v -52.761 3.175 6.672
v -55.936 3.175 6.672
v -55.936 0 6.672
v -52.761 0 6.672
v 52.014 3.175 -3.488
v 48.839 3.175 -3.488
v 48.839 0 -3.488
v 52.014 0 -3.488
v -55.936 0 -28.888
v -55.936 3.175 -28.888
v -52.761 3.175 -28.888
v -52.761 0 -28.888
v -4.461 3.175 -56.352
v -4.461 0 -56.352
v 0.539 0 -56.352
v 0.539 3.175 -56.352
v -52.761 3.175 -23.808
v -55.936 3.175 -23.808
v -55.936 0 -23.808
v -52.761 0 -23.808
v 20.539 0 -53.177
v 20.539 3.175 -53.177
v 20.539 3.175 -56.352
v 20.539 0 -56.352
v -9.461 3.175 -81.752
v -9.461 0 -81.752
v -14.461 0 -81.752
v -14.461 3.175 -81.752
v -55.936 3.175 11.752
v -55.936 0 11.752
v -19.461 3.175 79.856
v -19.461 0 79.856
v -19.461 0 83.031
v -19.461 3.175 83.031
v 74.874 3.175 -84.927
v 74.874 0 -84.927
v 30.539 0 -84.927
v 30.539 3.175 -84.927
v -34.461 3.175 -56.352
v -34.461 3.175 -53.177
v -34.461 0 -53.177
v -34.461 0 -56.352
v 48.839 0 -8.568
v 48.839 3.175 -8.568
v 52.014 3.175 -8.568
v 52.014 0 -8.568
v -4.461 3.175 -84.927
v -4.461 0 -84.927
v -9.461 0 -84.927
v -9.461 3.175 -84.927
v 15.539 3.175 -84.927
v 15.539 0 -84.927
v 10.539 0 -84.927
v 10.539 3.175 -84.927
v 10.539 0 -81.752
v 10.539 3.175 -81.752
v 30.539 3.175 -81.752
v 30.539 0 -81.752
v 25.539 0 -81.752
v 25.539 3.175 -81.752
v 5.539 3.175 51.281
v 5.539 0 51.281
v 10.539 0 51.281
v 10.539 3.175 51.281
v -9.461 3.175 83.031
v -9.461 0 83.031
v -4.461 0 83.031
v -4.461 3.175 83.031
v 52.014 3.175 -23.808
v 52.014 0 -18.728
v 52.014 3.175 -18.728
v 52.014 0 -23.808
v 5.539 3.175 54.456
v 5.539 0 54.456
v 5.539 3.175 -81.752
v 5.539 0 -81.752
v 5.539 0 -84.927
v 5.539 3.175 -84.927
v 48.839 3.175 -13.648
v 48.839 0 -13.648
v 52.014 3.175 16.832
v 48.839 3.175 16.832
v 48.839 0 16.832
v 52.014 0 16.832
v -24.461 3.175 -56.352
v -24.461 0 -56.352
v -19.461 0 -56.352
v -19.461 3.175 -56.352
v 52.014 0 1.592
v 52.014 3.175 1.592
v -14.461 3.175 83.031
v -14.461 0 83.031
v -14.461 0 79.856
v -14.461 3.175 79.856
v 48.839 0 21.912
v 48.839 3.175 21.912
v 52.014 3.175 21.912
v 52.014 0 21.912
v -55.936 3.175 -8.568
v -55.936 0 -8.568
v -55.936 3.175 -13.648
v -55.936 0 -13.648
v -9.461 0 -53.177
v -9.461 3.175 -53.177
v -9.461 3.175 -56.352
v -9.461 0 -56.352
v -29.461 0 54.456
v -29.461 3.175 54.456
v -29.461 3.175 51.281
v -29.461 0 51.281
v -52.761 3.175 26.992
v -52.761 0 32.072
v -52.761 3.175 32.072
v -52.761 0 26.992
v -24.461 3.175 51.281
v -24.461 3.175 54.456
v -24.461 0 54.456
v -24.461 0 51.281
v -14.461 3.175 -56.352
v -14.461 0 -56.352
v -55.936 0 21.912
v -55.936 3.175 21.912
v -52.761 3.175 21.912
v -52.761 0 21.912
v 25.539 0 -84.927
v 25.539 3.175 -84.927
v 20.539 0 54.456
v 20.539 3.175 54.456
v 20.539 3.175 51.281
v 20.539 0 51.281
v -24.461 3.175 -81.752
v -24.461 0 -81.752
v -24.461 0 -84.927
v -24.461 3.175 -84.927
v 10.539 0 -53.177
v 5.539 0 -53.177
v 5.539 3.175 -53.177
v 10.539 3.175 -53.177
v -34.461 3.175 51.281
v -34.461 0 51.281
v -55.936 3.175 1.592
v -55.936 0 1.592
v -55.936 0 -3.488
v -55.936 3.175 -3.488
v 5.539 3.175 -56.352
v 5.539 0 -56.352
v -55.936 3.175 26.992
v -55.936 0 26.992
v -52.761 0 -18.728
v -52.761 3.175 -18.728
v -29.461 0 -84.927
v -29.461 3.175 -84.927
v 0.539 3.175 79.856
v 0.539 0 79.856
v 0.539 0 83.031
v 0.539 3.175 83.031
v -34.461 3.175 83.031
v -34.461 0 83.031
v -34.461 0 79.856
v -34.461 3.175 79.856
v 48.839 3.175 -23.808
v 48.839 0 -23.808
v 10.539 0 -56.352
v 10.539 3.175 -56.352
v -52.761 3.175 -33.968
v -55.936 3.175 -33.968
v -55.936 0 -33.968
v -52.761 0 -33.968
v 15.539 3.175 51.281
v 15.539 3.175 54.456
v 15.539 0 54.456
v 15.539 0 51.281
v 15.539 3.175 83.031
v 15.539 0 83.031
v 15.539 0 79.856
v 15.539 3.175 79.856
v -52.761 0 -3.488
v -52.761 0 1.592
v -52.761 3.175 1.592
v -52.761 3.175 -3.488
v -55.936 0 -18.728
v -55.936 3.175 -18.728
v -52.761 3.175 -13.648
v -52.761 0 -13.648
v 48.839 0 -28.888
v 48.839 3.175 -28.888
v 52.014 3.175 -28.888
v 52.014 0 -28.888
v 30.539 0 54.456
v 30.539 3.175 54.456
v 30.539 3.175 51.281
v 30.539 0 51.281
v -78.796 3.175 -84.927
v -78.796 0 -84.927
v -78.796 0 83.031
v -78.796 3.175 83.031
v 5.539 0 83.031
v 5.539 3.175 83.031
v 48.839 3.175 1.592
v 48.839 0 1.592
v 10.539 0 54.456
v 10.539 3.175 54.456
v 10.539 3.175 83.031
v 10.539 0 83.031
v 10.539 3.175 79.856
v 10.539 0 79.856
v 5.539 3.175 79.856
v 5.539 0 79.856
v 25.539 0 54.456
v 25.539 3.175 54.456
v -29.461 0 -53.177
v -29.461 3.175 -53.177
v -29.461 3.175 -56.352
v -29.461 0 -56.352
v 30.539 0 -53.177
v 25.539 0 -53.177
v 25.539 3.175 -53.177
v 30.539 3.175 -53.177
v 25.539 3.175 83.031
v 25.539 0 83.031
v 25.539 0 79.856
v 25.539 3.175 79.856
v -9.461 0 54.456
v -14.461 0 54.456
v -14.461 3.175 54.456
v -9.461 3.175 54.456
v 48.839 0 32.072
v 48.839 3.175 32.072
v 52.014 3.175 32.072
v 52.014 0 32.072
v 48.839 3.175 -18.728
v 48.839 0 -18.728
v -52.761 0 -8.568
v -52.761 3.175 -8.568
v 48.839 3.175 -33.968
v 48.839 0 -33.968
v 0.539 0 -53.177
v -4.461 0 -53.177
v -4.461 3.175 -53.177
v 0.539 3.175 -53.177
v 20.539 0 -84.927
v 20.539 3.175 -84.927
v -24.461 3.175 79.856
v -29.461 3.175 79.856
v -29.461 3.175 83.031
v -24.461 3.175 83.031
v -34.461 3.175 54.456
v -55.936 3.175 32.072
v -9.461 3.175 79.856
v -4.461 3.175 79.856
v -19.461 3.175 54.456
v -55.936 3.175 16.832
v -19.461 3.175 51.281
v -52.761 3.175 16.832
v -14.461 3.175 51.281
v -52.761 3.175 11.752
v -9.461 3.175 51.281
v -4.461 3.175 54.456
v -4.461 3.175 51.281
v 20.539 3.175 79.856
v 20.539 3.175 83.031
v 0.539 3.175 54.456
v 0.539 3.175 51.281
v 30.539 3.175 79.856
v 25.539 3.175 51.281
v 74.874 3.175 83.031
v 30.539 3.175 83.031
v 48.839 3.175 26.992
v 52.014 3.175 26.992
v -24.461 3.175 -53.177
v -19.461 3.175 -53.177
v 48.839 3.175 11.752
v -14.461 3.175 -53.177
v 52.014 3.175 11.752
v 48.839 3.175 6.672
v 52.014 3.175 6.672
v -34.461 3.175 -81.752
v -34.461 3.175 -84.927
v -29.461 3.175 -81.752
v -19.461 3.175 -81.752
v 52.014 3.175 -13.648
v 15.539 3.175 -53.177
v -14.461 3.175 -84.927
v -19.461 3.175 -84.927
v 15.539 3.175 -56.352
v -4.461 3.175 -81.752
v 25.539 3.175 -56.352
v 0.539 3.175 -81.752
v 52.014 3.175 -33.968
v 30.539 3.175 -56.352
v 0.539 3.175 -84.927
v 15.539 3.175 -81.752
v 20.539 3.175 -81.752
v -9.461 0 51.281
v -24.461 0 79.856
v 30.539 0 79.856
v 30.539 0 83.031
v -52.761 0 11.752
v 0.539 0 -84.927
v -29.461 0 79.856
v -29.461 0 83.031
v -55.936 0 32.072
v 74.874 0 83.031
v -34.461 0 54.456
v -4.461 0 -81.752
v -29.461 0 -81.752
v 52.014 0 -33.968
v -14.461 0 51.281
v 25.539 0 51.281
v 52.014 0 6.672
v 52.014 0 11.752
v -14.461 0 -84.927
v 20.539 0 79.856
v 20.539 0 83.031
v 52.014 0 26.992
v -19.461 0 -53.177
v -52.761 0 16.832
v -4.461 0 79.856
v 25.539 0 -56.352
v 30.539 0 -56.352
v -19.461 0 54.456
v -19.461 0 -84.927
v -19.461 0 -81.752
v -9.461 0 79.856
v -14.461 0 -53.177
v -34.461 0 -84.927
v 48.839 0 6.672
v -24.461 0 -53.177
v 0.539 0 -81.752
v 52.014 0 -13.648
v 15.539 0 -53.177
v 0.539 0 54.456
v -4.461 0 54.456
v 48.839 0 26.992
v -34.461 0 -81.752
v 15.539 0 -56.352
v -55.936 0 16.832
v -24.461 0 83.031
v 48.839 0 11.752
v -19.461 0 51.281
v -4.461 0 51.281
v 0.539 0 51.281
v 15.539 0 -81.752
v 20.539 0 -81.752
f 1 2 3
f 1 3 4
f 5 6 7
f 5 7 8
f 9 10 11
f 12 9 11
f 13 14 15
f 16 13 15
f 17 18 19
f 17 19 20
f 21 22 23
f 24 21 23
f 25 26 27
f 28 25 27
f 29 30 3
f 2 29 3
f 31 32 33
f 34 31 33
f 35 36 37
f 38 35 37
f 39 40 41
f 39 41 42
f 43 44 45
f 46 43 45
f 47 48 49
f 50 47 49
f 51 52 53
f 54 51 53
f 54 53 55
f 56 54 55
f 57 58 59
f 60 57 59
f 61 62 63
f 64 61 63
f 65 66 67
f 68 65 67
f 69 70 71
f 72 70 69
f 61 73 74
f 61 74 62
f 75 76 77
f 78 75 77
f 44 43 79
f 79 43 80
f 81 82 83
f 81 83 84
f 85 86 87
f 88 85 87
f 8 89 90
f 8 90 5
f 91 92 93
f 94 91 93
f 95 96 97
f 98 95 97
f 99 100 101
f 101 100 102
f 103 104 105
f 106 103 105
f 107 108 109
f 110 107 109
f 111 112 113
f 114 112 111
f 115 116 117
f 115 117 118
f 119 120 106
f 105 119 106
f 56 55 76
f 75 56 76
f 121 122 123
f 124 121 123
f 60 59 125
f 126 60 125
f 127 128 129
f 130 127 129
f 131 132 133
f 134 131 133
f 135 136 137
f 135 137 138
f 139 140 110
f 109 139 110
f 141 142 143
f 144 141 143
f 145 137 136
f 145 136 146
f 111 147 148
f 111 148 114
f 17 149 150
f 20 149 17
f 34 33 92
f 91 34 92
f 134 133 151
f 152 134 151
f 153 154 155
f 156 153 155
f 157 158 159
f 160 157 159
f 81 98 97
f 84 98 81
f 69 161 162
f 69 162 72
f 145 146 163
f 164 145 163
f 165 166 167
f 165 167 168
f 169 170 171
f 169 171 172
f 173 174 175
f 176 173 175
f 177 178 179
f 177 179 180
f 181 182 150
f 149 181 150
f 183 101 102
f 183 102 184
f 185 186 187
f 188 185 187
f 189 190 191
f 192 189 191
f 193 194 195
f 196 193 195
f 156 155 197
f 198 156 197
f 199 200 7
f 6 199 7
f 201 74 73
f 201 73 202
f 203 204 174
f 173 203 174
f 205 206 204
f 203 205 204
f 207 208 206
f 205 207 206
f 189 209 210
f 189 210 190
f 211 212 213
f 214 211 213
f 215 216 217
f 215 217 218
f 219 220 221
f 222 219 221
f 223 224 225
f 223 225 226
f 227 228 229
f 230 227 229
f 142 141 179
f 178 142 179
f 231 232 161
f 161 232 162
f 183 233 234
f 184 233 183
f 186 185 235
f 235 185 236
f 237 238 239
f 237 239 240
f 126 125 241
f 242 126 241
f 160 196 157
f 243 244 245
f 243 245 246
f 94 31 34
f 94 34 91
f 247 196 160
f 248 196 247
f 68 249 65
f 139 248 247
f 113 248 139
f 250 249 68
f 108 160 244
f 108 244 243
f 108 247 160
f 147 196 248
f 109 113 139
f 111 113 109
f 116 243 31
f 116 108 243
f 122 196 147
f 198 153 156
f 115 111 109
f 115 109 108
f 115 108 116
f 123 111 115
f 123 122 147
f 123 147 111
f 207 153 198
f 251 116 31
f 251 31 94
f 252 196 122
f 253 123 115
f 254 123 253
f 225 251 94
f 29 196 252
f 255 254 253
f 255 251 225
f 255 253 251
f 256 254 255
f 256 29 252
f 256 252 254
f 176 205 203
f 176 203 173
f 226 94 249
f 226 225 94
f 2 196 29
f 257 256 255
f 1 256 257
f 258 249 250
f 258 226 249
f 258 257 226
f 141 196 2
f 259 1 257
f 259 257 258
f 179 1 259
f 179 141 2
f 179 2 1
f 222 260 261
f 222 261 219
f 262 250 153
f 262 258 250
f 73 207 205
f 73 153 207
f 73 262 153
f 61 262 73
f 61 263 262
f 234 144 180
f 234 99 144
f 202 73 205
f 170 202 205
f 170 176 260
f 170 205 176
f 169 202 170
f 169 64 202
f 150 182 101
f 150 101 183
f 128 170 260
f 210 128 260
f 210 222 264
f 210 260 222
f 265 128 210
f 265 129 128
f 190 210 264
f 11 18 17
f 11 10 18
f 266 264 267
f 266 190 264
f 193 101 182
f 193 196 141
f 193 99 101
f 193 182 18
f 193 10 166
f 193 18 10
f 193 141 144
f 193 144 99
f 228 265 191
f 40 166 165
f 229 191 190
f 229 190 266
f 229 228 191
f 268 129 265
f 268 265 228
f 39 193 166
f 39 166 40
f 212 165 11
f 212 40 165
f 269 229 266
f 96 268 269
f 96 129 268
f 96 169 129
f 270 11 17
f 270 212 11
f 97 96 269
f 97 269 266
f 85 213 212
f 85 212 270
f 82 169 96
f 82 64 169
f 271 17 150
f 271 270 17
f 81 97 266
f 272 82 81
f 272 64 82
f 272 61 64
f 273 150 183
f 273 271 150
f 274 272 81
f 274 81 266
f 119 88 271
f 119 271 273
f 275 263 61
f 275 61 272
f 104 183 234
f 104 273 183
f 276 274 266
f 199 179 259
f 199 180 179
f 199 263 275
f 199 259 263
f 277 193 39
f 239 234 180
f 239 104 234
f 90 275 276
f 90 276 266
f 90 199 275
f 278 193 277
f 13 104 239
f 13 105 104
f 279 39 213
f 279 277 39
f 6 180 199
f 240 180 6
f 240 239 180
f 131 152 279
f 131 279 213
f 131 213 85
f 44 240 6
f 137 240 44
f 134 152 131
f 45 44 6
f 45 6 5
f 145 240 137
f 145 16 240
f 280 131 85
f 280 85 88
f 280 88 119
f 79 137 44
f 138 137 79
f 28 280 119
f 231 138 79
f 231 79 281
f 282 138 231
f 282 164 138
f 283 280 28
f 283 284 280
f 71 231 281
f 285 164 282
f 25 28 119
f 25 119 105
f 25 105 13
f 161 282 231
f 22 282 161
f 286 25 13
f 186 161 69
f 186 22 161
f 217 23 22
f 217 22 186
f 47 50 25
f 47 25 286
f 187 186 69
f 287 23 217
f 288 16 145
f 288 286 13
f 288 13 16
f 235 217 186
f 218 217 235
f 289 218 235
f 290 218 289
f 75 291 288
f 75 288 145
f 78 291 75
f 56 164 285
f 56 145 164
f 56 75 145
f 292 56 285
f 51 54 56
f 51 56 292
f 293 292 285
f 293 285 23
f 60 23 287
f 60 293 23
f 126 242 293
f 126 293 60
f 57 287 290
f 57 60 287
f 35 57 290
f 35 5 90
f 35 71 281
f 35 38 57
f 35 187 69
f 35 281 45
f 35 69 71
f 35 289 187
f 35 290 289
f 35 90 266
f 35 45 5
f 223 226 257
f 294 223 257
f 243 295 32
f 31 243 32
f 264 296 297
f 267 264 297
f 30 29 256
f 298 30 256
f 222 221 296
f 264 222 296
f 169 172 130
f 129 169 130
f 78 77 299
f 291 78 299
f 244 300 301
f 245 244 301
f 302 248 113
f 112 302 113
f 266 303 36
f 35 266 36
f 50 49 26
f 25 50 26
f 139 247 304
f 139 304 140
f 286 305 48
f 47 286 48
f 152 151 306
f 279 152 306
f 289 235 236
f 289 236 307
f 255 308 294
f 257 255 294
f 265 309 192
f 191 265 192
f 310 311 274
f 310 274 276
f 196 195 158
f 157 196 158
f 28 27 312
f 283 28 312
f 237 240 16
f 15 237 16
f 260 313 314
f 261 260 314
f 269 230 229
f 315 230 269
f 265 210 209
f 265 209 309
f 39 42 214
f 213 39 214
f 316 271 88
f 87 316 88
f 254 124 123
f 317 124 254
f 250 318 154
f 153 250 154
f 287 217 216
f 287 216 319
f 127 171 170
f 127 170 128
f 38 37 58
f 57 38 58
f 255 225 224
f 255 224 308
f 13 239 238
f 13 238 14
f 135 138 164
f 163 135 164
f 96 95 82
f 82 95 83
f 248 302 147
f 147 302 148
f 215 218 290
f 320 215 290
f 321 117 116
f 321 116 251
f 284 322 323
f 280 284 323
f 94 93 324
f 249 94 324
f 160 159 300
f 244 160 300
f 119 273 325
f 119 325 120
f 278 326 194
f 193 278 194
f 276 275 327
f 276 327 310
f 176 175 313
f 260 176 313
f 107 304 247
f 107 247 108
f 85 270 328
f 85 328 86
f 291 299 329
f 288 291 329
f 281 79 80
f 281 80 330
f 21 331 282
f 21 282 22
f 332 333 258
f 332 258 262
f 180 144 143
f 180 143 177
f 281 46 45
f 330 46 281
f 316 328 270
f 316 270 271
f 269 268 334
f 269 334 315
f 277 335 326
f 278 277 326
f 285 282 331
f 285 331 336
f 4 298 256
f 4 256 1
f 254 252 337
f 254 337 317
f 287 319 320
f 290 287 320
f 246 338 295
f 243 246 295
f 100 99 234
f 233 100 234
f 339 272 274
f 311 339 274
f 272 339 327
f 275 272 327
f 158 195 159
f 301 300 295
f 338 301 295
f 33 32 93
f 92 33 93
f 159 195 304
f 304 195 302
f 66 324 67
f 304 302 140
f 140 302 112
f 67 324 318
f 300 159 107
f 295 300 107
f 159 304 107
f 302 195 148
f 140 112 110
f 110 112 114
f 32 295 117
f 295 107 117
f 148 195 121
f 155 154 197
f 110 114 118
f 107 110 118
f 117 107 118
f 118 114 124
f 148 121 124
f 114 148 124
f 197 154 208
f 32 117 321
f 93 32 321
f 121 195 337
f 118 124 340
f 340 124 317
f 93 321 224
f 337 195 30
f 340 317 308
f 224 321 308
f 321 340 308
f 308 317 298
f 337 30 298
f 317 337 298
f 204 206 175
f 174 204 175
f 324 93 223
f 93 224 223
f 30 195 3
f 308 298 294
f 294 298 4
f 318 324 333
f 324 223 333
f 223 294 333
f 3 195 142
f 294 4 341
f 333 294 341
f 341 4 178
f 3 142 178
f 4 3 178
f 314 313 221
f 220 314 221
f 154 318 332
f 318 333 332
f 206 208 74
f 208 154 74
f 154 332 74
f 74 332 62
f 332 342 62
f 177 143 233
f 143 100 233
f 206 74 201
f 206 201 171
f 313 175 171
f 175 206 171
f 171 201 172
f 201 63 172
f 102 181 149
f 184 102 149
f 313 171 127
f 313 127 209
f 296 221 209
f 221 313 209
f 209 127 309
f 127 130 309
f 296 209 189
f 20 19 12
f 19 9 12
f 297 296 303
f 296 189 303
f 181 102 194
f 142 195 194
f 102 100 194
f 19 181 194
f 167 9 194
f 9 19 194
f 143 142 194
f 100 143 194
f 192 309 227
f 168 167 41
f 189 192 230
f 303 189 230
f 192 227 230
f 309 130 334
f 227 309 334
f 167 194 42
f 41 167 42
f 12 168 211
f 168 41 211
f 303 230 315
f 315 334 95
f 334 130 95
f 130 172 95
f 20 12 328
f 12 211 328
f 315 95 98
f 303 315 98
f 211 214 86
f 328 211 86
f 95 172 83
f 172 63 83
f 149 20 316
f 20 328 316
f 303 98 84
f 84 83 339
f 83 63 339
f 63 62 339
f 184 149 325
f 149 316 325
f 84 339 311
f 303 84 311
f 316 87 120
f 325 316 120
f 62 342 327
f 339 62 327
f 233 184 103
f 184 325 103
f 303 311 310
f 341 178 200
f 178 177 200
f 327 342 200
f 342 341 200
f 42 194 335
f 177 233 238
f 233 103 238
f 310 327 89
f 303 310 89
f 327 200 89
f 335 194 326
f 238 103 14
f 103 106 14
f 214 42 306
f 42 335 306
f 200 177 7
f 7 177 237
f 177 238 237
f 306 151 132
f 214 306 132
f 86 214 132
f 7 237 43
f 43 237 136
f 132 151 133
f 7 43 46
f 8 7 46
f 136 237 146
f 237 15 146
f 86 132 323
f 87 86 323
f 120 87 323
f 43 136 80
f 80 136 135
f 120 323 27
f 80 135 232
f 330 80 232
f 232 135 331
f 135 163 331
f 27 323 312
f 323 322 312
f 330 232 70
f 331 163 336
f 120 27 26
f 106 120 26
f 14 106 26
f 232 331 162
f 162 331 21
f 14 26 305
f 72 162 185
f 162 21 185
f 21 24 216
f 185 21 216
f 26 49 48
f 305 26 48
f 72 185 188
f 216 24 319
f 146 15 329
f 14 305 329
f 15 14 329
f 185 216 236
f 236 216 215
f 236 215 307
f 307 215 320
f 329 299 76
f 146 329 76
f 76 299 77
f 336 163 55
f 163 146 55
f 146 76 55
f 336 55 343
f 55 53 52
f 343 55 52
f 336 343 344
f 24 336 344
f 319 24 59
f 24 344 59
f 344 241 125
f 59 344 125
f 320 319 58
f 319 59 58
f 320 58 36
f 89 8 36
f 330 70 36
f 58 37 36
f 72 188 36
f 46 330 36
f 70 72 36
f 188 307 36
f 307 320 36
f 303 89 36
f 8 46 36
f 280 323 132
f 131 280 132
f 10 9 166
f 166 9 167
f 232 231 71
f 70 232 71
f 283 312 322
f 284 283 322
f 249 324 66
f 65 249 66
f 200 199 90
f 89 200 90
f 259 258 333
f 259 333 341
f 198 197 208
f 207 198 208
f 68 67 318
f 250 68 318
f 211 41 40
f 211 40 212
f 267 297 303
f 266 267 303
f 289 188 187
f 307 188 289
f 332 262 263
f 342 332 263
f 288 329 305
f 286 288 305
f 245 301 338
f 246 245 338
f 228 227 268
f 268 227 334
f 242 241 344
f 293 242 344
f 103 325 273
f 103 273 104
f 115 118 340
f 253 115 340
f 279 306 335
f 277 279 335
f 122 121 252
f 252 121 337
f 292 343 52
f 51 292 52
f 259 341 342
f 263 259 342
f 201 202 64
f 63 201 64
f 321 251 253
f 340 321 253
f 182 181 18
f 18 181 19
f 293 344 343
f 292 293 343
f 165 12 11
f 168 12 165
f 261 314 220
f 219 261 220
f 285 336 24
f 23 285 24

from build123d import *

# Parameters (mm, degrees)
SKETCH1_W           = 5
SKETCH1_H           = 3.175
SKETCH1_W_2         = 3.175
SKETCH1_H_2         = 5.08
BOSS_EXTRUDE1_DEPTH = 3.175


with BuildPart() as part:
    # Sketch1 → Boss-Extrude1 (new body)
    with BuildSketch(Plane(origin=(0, 0, 0), x_dir=(1, 0, 0), z_dir=(0, 1, 0))):
        Polygon((-34.46085268, -83.030846574), (-34.46085268, -79.855846574), (-29.46085268, -79.855846574), (-29.46085268, -83.030846574), (-24.46085268, -83.030846574), (-24.46085268, -79.855846574), (-19.46085268, -79.855846574), (-19.46085268, -83.030846574), (-14.46085268, -83.030846574), (-14.46085268, -79.855846574), (-9.46085268, -79.855846574), (-9.46085268, -83.030846574), (-4.46085268, -83.030846574), (-4.46085268, -79.855846574), (0.53914732, -79.855846574), (0.53914732, -83.030846574), (5.53914732, -83.030846574), (5.53914732, -79.855846574), (10.53914732, -79.855846574), (10.53914732, -83.030846574), (15.53914732, -83.030846574), (15.53914732, -79.855846574), (20.53914732, -79.855846574), (20.53914732, -83.030846574), (25.53914732, -83.030846574), (25.53914732, -79.855846574), (30.53914732, -79.855846574), (30.53914732, -83.030846574), (74.87414732, -83.030846574), (74.87414732, 84.926653426), (30.53914732, 84.926653426), (30.53914732, 81.751653426), (25.53914732, 81.751653426), (25.53914732, 84.926653426), (20.53914732, 84.926653426), (20.53914732, 81.751653426), (15.53914732, 81.751653426), (15.53914732, 84.926653426), (10.53914732, 84.926653426), (10.53914732, 81.751653426), (5.53914732, 81.751653426), (5.53914732, 84.926653426), (0.53914732, 84.926653426), (0.53914732, 81.751653426), (-4.46085268, 81.751653426), (-4.46085268, 84.926653426), (-9.46085268, 84.926653426), (-9.46085268, 81.751653426), (-14.46085268, 81.751653426), (-14.46085268, 84.926653426), (-19.46085268, 84.926653426), (-19.46085268, 81.751653426), (-24.46085268, 81.751653426), (-24.46085268, 84.926653426), (-29.46085268, 84.926653426), (-29.46085268, 81.751653426), (-34.46085268, 81.751653426), (-34.46085268, 84.926653426), (-78.79585268, 84.926653426), (-78.79585268, -83.030846574), align=None)
        with Locations((-21.96085268, 54.764153426)):
            Rectangle(SKETCH1_W, SKETCH1_H, mode=Mode.SUBTRACT)
        with Locations((-31.96085268, 54.764153426)):
            Rectangle(SKETCH1_W, SKETCH1_H, mode=Mode.SUBTRACT)
        with Locations((-11.96085268, 54.764153426)):
            Rectangle(SKETCH1_W, SKETCH1_H, mode=Mode.SUBTRACT)
        with Locations((-1.96085268, 54.764153426)):
            Rectangle(SKETCH1_W, SKETCH1_H, mode=Mode.SUBTRACT)
        with Locations((8.03914732, 54.764153426)):
            Rectangle(SKETCH1_W, SKETCH1_H, mode=Mode.SUBTRACT)
        with Locations((18.03914732, 54.764153426)):
            Rectangle(SKETCH1_W, SKETCH1_H, mode=Mode.SUBTRACT)
        with Locations((28.03914732, 54.764153426)):
            Rectangle(SKETCH1_W, SKETCH1_H, mode=Mode.SUBTRACT)
        with Locations((-21.96085268, -52.868346574)):
            Rectangle(SKETCH1_W, SKETCH1_H, mode=Mode.SUBTRACT)
        with Locations((-31.96085268, -52.868346574)):
            Rectangle(SKETCH1_W, SKETCH1_H, mode=Mode.SUBTRACT)
        with Locations((-11.96085268, -52.868346574)):
            Rectangle(SKETCH1_W, SKETCH1_H, mode=Mode.SUBTRACT)
        with Locations((-1.96085268, -52.868346574)):
            Rectangle(SKETCH1_W, SKETCH1_H, mode=Mode.SUBTRACT)
        with Locations((8.03914732, -52.868346574)):
            Rectangle(SKETCH1_W, SKETCH1_H, mode=Mode.SUBTRACT)
        with Locations((18.03914732, -52.868346574)):
            Rectangle(SKETCH1_W, SKETCH1_H, mode=Mode.SUBTRACT)
        with Locations((28.03914732, -52.868346574)):
            Rectangle(SKETCH1_W, SKETCH1_H, mode=Mode.SUBTRACT)
        with Locations((-54.34835268, 21.267903426)):
            Rectangle(SKETCH1_W_2, SKETCH1_H_2, mode=Mode.SUBTRACT)
        with Locations((-54.34835268, 31.427903426)):
            Rectangle(SKETCH1_W_2, SKETCH1_H_2, mode=Mode.SUBTRACT)
        with Locations((-54.34835268, 11.107903426)):
            Rectangle(SKETCH1_W_2, SKETCH1_H_2, mode=Mode.SUBTRACT)
        with Locations((-54.34835268, 0.947903426)):
            Rectangle(SKETCH1_W_2, SKETCH1_H_2, mode=Mode.SUBTRACT)
        with Locations((-54.34835268, -9.212096574)):
            Rectangle(SKETCH1_W_2, SKETCH1_H_2, mode=Mode.SUBTRACT)
        with Locations((-54.34835268, -19.372096574)):
            Rectangle(SKETCH1_W_2, SKETCH1_H_2, mode=Mode.SUBTRACT)
        with Locations((-54.34835268, -29.532096574)):
            Rectangle(SKETCH1_W_2, SKETCH1_H_2, mode=Mode.SUBTRACT)
        with Locations((50.42664732, -29.532096574)):
            Rectangle(SKETCH1_W_2, SKETCH1_H_2, mode=Mode.SUBTRACT)
        with Locations((50.42664732, -19.372096574)):
            Rectangle(SKETCH1_W_2, SKETCH1_H_2, mode=Mode.SUBTRACT)
        with Locations((50.42664732, -9.212096574)):
            Rectangle(SKETCH1_W_2, SKETCH1_H_2, mode=Mode.SUBTRACT)
        with Locations((50.42664732, 0.947903426)):
            Rectangle(SKETCH1_W_2, SKETCH1_H_2, mode=Mode.SUBTRACT)
        with Locations((50.42664732, 11.107903426)):
            Rectangle(SKETCH1_W_2, SKETCH1_H_2, mode=Mode.SUBTRACT)
        with Locations((50.42664732, 21.267903426)):
            Rectangle(SKETCH1_W_2, SKETCH1_H_2, mode=Mode.SUBTRACT)
        with Locations((50.42664732, 31.427903426)):
            Rectangle(SKETCH1_W_2, SKETCH1_H_2, mode=Mode.SUBTRACT)
    extrude(amount=BOSS_EXTRUDE1_DEPTH)


solid = part.part
